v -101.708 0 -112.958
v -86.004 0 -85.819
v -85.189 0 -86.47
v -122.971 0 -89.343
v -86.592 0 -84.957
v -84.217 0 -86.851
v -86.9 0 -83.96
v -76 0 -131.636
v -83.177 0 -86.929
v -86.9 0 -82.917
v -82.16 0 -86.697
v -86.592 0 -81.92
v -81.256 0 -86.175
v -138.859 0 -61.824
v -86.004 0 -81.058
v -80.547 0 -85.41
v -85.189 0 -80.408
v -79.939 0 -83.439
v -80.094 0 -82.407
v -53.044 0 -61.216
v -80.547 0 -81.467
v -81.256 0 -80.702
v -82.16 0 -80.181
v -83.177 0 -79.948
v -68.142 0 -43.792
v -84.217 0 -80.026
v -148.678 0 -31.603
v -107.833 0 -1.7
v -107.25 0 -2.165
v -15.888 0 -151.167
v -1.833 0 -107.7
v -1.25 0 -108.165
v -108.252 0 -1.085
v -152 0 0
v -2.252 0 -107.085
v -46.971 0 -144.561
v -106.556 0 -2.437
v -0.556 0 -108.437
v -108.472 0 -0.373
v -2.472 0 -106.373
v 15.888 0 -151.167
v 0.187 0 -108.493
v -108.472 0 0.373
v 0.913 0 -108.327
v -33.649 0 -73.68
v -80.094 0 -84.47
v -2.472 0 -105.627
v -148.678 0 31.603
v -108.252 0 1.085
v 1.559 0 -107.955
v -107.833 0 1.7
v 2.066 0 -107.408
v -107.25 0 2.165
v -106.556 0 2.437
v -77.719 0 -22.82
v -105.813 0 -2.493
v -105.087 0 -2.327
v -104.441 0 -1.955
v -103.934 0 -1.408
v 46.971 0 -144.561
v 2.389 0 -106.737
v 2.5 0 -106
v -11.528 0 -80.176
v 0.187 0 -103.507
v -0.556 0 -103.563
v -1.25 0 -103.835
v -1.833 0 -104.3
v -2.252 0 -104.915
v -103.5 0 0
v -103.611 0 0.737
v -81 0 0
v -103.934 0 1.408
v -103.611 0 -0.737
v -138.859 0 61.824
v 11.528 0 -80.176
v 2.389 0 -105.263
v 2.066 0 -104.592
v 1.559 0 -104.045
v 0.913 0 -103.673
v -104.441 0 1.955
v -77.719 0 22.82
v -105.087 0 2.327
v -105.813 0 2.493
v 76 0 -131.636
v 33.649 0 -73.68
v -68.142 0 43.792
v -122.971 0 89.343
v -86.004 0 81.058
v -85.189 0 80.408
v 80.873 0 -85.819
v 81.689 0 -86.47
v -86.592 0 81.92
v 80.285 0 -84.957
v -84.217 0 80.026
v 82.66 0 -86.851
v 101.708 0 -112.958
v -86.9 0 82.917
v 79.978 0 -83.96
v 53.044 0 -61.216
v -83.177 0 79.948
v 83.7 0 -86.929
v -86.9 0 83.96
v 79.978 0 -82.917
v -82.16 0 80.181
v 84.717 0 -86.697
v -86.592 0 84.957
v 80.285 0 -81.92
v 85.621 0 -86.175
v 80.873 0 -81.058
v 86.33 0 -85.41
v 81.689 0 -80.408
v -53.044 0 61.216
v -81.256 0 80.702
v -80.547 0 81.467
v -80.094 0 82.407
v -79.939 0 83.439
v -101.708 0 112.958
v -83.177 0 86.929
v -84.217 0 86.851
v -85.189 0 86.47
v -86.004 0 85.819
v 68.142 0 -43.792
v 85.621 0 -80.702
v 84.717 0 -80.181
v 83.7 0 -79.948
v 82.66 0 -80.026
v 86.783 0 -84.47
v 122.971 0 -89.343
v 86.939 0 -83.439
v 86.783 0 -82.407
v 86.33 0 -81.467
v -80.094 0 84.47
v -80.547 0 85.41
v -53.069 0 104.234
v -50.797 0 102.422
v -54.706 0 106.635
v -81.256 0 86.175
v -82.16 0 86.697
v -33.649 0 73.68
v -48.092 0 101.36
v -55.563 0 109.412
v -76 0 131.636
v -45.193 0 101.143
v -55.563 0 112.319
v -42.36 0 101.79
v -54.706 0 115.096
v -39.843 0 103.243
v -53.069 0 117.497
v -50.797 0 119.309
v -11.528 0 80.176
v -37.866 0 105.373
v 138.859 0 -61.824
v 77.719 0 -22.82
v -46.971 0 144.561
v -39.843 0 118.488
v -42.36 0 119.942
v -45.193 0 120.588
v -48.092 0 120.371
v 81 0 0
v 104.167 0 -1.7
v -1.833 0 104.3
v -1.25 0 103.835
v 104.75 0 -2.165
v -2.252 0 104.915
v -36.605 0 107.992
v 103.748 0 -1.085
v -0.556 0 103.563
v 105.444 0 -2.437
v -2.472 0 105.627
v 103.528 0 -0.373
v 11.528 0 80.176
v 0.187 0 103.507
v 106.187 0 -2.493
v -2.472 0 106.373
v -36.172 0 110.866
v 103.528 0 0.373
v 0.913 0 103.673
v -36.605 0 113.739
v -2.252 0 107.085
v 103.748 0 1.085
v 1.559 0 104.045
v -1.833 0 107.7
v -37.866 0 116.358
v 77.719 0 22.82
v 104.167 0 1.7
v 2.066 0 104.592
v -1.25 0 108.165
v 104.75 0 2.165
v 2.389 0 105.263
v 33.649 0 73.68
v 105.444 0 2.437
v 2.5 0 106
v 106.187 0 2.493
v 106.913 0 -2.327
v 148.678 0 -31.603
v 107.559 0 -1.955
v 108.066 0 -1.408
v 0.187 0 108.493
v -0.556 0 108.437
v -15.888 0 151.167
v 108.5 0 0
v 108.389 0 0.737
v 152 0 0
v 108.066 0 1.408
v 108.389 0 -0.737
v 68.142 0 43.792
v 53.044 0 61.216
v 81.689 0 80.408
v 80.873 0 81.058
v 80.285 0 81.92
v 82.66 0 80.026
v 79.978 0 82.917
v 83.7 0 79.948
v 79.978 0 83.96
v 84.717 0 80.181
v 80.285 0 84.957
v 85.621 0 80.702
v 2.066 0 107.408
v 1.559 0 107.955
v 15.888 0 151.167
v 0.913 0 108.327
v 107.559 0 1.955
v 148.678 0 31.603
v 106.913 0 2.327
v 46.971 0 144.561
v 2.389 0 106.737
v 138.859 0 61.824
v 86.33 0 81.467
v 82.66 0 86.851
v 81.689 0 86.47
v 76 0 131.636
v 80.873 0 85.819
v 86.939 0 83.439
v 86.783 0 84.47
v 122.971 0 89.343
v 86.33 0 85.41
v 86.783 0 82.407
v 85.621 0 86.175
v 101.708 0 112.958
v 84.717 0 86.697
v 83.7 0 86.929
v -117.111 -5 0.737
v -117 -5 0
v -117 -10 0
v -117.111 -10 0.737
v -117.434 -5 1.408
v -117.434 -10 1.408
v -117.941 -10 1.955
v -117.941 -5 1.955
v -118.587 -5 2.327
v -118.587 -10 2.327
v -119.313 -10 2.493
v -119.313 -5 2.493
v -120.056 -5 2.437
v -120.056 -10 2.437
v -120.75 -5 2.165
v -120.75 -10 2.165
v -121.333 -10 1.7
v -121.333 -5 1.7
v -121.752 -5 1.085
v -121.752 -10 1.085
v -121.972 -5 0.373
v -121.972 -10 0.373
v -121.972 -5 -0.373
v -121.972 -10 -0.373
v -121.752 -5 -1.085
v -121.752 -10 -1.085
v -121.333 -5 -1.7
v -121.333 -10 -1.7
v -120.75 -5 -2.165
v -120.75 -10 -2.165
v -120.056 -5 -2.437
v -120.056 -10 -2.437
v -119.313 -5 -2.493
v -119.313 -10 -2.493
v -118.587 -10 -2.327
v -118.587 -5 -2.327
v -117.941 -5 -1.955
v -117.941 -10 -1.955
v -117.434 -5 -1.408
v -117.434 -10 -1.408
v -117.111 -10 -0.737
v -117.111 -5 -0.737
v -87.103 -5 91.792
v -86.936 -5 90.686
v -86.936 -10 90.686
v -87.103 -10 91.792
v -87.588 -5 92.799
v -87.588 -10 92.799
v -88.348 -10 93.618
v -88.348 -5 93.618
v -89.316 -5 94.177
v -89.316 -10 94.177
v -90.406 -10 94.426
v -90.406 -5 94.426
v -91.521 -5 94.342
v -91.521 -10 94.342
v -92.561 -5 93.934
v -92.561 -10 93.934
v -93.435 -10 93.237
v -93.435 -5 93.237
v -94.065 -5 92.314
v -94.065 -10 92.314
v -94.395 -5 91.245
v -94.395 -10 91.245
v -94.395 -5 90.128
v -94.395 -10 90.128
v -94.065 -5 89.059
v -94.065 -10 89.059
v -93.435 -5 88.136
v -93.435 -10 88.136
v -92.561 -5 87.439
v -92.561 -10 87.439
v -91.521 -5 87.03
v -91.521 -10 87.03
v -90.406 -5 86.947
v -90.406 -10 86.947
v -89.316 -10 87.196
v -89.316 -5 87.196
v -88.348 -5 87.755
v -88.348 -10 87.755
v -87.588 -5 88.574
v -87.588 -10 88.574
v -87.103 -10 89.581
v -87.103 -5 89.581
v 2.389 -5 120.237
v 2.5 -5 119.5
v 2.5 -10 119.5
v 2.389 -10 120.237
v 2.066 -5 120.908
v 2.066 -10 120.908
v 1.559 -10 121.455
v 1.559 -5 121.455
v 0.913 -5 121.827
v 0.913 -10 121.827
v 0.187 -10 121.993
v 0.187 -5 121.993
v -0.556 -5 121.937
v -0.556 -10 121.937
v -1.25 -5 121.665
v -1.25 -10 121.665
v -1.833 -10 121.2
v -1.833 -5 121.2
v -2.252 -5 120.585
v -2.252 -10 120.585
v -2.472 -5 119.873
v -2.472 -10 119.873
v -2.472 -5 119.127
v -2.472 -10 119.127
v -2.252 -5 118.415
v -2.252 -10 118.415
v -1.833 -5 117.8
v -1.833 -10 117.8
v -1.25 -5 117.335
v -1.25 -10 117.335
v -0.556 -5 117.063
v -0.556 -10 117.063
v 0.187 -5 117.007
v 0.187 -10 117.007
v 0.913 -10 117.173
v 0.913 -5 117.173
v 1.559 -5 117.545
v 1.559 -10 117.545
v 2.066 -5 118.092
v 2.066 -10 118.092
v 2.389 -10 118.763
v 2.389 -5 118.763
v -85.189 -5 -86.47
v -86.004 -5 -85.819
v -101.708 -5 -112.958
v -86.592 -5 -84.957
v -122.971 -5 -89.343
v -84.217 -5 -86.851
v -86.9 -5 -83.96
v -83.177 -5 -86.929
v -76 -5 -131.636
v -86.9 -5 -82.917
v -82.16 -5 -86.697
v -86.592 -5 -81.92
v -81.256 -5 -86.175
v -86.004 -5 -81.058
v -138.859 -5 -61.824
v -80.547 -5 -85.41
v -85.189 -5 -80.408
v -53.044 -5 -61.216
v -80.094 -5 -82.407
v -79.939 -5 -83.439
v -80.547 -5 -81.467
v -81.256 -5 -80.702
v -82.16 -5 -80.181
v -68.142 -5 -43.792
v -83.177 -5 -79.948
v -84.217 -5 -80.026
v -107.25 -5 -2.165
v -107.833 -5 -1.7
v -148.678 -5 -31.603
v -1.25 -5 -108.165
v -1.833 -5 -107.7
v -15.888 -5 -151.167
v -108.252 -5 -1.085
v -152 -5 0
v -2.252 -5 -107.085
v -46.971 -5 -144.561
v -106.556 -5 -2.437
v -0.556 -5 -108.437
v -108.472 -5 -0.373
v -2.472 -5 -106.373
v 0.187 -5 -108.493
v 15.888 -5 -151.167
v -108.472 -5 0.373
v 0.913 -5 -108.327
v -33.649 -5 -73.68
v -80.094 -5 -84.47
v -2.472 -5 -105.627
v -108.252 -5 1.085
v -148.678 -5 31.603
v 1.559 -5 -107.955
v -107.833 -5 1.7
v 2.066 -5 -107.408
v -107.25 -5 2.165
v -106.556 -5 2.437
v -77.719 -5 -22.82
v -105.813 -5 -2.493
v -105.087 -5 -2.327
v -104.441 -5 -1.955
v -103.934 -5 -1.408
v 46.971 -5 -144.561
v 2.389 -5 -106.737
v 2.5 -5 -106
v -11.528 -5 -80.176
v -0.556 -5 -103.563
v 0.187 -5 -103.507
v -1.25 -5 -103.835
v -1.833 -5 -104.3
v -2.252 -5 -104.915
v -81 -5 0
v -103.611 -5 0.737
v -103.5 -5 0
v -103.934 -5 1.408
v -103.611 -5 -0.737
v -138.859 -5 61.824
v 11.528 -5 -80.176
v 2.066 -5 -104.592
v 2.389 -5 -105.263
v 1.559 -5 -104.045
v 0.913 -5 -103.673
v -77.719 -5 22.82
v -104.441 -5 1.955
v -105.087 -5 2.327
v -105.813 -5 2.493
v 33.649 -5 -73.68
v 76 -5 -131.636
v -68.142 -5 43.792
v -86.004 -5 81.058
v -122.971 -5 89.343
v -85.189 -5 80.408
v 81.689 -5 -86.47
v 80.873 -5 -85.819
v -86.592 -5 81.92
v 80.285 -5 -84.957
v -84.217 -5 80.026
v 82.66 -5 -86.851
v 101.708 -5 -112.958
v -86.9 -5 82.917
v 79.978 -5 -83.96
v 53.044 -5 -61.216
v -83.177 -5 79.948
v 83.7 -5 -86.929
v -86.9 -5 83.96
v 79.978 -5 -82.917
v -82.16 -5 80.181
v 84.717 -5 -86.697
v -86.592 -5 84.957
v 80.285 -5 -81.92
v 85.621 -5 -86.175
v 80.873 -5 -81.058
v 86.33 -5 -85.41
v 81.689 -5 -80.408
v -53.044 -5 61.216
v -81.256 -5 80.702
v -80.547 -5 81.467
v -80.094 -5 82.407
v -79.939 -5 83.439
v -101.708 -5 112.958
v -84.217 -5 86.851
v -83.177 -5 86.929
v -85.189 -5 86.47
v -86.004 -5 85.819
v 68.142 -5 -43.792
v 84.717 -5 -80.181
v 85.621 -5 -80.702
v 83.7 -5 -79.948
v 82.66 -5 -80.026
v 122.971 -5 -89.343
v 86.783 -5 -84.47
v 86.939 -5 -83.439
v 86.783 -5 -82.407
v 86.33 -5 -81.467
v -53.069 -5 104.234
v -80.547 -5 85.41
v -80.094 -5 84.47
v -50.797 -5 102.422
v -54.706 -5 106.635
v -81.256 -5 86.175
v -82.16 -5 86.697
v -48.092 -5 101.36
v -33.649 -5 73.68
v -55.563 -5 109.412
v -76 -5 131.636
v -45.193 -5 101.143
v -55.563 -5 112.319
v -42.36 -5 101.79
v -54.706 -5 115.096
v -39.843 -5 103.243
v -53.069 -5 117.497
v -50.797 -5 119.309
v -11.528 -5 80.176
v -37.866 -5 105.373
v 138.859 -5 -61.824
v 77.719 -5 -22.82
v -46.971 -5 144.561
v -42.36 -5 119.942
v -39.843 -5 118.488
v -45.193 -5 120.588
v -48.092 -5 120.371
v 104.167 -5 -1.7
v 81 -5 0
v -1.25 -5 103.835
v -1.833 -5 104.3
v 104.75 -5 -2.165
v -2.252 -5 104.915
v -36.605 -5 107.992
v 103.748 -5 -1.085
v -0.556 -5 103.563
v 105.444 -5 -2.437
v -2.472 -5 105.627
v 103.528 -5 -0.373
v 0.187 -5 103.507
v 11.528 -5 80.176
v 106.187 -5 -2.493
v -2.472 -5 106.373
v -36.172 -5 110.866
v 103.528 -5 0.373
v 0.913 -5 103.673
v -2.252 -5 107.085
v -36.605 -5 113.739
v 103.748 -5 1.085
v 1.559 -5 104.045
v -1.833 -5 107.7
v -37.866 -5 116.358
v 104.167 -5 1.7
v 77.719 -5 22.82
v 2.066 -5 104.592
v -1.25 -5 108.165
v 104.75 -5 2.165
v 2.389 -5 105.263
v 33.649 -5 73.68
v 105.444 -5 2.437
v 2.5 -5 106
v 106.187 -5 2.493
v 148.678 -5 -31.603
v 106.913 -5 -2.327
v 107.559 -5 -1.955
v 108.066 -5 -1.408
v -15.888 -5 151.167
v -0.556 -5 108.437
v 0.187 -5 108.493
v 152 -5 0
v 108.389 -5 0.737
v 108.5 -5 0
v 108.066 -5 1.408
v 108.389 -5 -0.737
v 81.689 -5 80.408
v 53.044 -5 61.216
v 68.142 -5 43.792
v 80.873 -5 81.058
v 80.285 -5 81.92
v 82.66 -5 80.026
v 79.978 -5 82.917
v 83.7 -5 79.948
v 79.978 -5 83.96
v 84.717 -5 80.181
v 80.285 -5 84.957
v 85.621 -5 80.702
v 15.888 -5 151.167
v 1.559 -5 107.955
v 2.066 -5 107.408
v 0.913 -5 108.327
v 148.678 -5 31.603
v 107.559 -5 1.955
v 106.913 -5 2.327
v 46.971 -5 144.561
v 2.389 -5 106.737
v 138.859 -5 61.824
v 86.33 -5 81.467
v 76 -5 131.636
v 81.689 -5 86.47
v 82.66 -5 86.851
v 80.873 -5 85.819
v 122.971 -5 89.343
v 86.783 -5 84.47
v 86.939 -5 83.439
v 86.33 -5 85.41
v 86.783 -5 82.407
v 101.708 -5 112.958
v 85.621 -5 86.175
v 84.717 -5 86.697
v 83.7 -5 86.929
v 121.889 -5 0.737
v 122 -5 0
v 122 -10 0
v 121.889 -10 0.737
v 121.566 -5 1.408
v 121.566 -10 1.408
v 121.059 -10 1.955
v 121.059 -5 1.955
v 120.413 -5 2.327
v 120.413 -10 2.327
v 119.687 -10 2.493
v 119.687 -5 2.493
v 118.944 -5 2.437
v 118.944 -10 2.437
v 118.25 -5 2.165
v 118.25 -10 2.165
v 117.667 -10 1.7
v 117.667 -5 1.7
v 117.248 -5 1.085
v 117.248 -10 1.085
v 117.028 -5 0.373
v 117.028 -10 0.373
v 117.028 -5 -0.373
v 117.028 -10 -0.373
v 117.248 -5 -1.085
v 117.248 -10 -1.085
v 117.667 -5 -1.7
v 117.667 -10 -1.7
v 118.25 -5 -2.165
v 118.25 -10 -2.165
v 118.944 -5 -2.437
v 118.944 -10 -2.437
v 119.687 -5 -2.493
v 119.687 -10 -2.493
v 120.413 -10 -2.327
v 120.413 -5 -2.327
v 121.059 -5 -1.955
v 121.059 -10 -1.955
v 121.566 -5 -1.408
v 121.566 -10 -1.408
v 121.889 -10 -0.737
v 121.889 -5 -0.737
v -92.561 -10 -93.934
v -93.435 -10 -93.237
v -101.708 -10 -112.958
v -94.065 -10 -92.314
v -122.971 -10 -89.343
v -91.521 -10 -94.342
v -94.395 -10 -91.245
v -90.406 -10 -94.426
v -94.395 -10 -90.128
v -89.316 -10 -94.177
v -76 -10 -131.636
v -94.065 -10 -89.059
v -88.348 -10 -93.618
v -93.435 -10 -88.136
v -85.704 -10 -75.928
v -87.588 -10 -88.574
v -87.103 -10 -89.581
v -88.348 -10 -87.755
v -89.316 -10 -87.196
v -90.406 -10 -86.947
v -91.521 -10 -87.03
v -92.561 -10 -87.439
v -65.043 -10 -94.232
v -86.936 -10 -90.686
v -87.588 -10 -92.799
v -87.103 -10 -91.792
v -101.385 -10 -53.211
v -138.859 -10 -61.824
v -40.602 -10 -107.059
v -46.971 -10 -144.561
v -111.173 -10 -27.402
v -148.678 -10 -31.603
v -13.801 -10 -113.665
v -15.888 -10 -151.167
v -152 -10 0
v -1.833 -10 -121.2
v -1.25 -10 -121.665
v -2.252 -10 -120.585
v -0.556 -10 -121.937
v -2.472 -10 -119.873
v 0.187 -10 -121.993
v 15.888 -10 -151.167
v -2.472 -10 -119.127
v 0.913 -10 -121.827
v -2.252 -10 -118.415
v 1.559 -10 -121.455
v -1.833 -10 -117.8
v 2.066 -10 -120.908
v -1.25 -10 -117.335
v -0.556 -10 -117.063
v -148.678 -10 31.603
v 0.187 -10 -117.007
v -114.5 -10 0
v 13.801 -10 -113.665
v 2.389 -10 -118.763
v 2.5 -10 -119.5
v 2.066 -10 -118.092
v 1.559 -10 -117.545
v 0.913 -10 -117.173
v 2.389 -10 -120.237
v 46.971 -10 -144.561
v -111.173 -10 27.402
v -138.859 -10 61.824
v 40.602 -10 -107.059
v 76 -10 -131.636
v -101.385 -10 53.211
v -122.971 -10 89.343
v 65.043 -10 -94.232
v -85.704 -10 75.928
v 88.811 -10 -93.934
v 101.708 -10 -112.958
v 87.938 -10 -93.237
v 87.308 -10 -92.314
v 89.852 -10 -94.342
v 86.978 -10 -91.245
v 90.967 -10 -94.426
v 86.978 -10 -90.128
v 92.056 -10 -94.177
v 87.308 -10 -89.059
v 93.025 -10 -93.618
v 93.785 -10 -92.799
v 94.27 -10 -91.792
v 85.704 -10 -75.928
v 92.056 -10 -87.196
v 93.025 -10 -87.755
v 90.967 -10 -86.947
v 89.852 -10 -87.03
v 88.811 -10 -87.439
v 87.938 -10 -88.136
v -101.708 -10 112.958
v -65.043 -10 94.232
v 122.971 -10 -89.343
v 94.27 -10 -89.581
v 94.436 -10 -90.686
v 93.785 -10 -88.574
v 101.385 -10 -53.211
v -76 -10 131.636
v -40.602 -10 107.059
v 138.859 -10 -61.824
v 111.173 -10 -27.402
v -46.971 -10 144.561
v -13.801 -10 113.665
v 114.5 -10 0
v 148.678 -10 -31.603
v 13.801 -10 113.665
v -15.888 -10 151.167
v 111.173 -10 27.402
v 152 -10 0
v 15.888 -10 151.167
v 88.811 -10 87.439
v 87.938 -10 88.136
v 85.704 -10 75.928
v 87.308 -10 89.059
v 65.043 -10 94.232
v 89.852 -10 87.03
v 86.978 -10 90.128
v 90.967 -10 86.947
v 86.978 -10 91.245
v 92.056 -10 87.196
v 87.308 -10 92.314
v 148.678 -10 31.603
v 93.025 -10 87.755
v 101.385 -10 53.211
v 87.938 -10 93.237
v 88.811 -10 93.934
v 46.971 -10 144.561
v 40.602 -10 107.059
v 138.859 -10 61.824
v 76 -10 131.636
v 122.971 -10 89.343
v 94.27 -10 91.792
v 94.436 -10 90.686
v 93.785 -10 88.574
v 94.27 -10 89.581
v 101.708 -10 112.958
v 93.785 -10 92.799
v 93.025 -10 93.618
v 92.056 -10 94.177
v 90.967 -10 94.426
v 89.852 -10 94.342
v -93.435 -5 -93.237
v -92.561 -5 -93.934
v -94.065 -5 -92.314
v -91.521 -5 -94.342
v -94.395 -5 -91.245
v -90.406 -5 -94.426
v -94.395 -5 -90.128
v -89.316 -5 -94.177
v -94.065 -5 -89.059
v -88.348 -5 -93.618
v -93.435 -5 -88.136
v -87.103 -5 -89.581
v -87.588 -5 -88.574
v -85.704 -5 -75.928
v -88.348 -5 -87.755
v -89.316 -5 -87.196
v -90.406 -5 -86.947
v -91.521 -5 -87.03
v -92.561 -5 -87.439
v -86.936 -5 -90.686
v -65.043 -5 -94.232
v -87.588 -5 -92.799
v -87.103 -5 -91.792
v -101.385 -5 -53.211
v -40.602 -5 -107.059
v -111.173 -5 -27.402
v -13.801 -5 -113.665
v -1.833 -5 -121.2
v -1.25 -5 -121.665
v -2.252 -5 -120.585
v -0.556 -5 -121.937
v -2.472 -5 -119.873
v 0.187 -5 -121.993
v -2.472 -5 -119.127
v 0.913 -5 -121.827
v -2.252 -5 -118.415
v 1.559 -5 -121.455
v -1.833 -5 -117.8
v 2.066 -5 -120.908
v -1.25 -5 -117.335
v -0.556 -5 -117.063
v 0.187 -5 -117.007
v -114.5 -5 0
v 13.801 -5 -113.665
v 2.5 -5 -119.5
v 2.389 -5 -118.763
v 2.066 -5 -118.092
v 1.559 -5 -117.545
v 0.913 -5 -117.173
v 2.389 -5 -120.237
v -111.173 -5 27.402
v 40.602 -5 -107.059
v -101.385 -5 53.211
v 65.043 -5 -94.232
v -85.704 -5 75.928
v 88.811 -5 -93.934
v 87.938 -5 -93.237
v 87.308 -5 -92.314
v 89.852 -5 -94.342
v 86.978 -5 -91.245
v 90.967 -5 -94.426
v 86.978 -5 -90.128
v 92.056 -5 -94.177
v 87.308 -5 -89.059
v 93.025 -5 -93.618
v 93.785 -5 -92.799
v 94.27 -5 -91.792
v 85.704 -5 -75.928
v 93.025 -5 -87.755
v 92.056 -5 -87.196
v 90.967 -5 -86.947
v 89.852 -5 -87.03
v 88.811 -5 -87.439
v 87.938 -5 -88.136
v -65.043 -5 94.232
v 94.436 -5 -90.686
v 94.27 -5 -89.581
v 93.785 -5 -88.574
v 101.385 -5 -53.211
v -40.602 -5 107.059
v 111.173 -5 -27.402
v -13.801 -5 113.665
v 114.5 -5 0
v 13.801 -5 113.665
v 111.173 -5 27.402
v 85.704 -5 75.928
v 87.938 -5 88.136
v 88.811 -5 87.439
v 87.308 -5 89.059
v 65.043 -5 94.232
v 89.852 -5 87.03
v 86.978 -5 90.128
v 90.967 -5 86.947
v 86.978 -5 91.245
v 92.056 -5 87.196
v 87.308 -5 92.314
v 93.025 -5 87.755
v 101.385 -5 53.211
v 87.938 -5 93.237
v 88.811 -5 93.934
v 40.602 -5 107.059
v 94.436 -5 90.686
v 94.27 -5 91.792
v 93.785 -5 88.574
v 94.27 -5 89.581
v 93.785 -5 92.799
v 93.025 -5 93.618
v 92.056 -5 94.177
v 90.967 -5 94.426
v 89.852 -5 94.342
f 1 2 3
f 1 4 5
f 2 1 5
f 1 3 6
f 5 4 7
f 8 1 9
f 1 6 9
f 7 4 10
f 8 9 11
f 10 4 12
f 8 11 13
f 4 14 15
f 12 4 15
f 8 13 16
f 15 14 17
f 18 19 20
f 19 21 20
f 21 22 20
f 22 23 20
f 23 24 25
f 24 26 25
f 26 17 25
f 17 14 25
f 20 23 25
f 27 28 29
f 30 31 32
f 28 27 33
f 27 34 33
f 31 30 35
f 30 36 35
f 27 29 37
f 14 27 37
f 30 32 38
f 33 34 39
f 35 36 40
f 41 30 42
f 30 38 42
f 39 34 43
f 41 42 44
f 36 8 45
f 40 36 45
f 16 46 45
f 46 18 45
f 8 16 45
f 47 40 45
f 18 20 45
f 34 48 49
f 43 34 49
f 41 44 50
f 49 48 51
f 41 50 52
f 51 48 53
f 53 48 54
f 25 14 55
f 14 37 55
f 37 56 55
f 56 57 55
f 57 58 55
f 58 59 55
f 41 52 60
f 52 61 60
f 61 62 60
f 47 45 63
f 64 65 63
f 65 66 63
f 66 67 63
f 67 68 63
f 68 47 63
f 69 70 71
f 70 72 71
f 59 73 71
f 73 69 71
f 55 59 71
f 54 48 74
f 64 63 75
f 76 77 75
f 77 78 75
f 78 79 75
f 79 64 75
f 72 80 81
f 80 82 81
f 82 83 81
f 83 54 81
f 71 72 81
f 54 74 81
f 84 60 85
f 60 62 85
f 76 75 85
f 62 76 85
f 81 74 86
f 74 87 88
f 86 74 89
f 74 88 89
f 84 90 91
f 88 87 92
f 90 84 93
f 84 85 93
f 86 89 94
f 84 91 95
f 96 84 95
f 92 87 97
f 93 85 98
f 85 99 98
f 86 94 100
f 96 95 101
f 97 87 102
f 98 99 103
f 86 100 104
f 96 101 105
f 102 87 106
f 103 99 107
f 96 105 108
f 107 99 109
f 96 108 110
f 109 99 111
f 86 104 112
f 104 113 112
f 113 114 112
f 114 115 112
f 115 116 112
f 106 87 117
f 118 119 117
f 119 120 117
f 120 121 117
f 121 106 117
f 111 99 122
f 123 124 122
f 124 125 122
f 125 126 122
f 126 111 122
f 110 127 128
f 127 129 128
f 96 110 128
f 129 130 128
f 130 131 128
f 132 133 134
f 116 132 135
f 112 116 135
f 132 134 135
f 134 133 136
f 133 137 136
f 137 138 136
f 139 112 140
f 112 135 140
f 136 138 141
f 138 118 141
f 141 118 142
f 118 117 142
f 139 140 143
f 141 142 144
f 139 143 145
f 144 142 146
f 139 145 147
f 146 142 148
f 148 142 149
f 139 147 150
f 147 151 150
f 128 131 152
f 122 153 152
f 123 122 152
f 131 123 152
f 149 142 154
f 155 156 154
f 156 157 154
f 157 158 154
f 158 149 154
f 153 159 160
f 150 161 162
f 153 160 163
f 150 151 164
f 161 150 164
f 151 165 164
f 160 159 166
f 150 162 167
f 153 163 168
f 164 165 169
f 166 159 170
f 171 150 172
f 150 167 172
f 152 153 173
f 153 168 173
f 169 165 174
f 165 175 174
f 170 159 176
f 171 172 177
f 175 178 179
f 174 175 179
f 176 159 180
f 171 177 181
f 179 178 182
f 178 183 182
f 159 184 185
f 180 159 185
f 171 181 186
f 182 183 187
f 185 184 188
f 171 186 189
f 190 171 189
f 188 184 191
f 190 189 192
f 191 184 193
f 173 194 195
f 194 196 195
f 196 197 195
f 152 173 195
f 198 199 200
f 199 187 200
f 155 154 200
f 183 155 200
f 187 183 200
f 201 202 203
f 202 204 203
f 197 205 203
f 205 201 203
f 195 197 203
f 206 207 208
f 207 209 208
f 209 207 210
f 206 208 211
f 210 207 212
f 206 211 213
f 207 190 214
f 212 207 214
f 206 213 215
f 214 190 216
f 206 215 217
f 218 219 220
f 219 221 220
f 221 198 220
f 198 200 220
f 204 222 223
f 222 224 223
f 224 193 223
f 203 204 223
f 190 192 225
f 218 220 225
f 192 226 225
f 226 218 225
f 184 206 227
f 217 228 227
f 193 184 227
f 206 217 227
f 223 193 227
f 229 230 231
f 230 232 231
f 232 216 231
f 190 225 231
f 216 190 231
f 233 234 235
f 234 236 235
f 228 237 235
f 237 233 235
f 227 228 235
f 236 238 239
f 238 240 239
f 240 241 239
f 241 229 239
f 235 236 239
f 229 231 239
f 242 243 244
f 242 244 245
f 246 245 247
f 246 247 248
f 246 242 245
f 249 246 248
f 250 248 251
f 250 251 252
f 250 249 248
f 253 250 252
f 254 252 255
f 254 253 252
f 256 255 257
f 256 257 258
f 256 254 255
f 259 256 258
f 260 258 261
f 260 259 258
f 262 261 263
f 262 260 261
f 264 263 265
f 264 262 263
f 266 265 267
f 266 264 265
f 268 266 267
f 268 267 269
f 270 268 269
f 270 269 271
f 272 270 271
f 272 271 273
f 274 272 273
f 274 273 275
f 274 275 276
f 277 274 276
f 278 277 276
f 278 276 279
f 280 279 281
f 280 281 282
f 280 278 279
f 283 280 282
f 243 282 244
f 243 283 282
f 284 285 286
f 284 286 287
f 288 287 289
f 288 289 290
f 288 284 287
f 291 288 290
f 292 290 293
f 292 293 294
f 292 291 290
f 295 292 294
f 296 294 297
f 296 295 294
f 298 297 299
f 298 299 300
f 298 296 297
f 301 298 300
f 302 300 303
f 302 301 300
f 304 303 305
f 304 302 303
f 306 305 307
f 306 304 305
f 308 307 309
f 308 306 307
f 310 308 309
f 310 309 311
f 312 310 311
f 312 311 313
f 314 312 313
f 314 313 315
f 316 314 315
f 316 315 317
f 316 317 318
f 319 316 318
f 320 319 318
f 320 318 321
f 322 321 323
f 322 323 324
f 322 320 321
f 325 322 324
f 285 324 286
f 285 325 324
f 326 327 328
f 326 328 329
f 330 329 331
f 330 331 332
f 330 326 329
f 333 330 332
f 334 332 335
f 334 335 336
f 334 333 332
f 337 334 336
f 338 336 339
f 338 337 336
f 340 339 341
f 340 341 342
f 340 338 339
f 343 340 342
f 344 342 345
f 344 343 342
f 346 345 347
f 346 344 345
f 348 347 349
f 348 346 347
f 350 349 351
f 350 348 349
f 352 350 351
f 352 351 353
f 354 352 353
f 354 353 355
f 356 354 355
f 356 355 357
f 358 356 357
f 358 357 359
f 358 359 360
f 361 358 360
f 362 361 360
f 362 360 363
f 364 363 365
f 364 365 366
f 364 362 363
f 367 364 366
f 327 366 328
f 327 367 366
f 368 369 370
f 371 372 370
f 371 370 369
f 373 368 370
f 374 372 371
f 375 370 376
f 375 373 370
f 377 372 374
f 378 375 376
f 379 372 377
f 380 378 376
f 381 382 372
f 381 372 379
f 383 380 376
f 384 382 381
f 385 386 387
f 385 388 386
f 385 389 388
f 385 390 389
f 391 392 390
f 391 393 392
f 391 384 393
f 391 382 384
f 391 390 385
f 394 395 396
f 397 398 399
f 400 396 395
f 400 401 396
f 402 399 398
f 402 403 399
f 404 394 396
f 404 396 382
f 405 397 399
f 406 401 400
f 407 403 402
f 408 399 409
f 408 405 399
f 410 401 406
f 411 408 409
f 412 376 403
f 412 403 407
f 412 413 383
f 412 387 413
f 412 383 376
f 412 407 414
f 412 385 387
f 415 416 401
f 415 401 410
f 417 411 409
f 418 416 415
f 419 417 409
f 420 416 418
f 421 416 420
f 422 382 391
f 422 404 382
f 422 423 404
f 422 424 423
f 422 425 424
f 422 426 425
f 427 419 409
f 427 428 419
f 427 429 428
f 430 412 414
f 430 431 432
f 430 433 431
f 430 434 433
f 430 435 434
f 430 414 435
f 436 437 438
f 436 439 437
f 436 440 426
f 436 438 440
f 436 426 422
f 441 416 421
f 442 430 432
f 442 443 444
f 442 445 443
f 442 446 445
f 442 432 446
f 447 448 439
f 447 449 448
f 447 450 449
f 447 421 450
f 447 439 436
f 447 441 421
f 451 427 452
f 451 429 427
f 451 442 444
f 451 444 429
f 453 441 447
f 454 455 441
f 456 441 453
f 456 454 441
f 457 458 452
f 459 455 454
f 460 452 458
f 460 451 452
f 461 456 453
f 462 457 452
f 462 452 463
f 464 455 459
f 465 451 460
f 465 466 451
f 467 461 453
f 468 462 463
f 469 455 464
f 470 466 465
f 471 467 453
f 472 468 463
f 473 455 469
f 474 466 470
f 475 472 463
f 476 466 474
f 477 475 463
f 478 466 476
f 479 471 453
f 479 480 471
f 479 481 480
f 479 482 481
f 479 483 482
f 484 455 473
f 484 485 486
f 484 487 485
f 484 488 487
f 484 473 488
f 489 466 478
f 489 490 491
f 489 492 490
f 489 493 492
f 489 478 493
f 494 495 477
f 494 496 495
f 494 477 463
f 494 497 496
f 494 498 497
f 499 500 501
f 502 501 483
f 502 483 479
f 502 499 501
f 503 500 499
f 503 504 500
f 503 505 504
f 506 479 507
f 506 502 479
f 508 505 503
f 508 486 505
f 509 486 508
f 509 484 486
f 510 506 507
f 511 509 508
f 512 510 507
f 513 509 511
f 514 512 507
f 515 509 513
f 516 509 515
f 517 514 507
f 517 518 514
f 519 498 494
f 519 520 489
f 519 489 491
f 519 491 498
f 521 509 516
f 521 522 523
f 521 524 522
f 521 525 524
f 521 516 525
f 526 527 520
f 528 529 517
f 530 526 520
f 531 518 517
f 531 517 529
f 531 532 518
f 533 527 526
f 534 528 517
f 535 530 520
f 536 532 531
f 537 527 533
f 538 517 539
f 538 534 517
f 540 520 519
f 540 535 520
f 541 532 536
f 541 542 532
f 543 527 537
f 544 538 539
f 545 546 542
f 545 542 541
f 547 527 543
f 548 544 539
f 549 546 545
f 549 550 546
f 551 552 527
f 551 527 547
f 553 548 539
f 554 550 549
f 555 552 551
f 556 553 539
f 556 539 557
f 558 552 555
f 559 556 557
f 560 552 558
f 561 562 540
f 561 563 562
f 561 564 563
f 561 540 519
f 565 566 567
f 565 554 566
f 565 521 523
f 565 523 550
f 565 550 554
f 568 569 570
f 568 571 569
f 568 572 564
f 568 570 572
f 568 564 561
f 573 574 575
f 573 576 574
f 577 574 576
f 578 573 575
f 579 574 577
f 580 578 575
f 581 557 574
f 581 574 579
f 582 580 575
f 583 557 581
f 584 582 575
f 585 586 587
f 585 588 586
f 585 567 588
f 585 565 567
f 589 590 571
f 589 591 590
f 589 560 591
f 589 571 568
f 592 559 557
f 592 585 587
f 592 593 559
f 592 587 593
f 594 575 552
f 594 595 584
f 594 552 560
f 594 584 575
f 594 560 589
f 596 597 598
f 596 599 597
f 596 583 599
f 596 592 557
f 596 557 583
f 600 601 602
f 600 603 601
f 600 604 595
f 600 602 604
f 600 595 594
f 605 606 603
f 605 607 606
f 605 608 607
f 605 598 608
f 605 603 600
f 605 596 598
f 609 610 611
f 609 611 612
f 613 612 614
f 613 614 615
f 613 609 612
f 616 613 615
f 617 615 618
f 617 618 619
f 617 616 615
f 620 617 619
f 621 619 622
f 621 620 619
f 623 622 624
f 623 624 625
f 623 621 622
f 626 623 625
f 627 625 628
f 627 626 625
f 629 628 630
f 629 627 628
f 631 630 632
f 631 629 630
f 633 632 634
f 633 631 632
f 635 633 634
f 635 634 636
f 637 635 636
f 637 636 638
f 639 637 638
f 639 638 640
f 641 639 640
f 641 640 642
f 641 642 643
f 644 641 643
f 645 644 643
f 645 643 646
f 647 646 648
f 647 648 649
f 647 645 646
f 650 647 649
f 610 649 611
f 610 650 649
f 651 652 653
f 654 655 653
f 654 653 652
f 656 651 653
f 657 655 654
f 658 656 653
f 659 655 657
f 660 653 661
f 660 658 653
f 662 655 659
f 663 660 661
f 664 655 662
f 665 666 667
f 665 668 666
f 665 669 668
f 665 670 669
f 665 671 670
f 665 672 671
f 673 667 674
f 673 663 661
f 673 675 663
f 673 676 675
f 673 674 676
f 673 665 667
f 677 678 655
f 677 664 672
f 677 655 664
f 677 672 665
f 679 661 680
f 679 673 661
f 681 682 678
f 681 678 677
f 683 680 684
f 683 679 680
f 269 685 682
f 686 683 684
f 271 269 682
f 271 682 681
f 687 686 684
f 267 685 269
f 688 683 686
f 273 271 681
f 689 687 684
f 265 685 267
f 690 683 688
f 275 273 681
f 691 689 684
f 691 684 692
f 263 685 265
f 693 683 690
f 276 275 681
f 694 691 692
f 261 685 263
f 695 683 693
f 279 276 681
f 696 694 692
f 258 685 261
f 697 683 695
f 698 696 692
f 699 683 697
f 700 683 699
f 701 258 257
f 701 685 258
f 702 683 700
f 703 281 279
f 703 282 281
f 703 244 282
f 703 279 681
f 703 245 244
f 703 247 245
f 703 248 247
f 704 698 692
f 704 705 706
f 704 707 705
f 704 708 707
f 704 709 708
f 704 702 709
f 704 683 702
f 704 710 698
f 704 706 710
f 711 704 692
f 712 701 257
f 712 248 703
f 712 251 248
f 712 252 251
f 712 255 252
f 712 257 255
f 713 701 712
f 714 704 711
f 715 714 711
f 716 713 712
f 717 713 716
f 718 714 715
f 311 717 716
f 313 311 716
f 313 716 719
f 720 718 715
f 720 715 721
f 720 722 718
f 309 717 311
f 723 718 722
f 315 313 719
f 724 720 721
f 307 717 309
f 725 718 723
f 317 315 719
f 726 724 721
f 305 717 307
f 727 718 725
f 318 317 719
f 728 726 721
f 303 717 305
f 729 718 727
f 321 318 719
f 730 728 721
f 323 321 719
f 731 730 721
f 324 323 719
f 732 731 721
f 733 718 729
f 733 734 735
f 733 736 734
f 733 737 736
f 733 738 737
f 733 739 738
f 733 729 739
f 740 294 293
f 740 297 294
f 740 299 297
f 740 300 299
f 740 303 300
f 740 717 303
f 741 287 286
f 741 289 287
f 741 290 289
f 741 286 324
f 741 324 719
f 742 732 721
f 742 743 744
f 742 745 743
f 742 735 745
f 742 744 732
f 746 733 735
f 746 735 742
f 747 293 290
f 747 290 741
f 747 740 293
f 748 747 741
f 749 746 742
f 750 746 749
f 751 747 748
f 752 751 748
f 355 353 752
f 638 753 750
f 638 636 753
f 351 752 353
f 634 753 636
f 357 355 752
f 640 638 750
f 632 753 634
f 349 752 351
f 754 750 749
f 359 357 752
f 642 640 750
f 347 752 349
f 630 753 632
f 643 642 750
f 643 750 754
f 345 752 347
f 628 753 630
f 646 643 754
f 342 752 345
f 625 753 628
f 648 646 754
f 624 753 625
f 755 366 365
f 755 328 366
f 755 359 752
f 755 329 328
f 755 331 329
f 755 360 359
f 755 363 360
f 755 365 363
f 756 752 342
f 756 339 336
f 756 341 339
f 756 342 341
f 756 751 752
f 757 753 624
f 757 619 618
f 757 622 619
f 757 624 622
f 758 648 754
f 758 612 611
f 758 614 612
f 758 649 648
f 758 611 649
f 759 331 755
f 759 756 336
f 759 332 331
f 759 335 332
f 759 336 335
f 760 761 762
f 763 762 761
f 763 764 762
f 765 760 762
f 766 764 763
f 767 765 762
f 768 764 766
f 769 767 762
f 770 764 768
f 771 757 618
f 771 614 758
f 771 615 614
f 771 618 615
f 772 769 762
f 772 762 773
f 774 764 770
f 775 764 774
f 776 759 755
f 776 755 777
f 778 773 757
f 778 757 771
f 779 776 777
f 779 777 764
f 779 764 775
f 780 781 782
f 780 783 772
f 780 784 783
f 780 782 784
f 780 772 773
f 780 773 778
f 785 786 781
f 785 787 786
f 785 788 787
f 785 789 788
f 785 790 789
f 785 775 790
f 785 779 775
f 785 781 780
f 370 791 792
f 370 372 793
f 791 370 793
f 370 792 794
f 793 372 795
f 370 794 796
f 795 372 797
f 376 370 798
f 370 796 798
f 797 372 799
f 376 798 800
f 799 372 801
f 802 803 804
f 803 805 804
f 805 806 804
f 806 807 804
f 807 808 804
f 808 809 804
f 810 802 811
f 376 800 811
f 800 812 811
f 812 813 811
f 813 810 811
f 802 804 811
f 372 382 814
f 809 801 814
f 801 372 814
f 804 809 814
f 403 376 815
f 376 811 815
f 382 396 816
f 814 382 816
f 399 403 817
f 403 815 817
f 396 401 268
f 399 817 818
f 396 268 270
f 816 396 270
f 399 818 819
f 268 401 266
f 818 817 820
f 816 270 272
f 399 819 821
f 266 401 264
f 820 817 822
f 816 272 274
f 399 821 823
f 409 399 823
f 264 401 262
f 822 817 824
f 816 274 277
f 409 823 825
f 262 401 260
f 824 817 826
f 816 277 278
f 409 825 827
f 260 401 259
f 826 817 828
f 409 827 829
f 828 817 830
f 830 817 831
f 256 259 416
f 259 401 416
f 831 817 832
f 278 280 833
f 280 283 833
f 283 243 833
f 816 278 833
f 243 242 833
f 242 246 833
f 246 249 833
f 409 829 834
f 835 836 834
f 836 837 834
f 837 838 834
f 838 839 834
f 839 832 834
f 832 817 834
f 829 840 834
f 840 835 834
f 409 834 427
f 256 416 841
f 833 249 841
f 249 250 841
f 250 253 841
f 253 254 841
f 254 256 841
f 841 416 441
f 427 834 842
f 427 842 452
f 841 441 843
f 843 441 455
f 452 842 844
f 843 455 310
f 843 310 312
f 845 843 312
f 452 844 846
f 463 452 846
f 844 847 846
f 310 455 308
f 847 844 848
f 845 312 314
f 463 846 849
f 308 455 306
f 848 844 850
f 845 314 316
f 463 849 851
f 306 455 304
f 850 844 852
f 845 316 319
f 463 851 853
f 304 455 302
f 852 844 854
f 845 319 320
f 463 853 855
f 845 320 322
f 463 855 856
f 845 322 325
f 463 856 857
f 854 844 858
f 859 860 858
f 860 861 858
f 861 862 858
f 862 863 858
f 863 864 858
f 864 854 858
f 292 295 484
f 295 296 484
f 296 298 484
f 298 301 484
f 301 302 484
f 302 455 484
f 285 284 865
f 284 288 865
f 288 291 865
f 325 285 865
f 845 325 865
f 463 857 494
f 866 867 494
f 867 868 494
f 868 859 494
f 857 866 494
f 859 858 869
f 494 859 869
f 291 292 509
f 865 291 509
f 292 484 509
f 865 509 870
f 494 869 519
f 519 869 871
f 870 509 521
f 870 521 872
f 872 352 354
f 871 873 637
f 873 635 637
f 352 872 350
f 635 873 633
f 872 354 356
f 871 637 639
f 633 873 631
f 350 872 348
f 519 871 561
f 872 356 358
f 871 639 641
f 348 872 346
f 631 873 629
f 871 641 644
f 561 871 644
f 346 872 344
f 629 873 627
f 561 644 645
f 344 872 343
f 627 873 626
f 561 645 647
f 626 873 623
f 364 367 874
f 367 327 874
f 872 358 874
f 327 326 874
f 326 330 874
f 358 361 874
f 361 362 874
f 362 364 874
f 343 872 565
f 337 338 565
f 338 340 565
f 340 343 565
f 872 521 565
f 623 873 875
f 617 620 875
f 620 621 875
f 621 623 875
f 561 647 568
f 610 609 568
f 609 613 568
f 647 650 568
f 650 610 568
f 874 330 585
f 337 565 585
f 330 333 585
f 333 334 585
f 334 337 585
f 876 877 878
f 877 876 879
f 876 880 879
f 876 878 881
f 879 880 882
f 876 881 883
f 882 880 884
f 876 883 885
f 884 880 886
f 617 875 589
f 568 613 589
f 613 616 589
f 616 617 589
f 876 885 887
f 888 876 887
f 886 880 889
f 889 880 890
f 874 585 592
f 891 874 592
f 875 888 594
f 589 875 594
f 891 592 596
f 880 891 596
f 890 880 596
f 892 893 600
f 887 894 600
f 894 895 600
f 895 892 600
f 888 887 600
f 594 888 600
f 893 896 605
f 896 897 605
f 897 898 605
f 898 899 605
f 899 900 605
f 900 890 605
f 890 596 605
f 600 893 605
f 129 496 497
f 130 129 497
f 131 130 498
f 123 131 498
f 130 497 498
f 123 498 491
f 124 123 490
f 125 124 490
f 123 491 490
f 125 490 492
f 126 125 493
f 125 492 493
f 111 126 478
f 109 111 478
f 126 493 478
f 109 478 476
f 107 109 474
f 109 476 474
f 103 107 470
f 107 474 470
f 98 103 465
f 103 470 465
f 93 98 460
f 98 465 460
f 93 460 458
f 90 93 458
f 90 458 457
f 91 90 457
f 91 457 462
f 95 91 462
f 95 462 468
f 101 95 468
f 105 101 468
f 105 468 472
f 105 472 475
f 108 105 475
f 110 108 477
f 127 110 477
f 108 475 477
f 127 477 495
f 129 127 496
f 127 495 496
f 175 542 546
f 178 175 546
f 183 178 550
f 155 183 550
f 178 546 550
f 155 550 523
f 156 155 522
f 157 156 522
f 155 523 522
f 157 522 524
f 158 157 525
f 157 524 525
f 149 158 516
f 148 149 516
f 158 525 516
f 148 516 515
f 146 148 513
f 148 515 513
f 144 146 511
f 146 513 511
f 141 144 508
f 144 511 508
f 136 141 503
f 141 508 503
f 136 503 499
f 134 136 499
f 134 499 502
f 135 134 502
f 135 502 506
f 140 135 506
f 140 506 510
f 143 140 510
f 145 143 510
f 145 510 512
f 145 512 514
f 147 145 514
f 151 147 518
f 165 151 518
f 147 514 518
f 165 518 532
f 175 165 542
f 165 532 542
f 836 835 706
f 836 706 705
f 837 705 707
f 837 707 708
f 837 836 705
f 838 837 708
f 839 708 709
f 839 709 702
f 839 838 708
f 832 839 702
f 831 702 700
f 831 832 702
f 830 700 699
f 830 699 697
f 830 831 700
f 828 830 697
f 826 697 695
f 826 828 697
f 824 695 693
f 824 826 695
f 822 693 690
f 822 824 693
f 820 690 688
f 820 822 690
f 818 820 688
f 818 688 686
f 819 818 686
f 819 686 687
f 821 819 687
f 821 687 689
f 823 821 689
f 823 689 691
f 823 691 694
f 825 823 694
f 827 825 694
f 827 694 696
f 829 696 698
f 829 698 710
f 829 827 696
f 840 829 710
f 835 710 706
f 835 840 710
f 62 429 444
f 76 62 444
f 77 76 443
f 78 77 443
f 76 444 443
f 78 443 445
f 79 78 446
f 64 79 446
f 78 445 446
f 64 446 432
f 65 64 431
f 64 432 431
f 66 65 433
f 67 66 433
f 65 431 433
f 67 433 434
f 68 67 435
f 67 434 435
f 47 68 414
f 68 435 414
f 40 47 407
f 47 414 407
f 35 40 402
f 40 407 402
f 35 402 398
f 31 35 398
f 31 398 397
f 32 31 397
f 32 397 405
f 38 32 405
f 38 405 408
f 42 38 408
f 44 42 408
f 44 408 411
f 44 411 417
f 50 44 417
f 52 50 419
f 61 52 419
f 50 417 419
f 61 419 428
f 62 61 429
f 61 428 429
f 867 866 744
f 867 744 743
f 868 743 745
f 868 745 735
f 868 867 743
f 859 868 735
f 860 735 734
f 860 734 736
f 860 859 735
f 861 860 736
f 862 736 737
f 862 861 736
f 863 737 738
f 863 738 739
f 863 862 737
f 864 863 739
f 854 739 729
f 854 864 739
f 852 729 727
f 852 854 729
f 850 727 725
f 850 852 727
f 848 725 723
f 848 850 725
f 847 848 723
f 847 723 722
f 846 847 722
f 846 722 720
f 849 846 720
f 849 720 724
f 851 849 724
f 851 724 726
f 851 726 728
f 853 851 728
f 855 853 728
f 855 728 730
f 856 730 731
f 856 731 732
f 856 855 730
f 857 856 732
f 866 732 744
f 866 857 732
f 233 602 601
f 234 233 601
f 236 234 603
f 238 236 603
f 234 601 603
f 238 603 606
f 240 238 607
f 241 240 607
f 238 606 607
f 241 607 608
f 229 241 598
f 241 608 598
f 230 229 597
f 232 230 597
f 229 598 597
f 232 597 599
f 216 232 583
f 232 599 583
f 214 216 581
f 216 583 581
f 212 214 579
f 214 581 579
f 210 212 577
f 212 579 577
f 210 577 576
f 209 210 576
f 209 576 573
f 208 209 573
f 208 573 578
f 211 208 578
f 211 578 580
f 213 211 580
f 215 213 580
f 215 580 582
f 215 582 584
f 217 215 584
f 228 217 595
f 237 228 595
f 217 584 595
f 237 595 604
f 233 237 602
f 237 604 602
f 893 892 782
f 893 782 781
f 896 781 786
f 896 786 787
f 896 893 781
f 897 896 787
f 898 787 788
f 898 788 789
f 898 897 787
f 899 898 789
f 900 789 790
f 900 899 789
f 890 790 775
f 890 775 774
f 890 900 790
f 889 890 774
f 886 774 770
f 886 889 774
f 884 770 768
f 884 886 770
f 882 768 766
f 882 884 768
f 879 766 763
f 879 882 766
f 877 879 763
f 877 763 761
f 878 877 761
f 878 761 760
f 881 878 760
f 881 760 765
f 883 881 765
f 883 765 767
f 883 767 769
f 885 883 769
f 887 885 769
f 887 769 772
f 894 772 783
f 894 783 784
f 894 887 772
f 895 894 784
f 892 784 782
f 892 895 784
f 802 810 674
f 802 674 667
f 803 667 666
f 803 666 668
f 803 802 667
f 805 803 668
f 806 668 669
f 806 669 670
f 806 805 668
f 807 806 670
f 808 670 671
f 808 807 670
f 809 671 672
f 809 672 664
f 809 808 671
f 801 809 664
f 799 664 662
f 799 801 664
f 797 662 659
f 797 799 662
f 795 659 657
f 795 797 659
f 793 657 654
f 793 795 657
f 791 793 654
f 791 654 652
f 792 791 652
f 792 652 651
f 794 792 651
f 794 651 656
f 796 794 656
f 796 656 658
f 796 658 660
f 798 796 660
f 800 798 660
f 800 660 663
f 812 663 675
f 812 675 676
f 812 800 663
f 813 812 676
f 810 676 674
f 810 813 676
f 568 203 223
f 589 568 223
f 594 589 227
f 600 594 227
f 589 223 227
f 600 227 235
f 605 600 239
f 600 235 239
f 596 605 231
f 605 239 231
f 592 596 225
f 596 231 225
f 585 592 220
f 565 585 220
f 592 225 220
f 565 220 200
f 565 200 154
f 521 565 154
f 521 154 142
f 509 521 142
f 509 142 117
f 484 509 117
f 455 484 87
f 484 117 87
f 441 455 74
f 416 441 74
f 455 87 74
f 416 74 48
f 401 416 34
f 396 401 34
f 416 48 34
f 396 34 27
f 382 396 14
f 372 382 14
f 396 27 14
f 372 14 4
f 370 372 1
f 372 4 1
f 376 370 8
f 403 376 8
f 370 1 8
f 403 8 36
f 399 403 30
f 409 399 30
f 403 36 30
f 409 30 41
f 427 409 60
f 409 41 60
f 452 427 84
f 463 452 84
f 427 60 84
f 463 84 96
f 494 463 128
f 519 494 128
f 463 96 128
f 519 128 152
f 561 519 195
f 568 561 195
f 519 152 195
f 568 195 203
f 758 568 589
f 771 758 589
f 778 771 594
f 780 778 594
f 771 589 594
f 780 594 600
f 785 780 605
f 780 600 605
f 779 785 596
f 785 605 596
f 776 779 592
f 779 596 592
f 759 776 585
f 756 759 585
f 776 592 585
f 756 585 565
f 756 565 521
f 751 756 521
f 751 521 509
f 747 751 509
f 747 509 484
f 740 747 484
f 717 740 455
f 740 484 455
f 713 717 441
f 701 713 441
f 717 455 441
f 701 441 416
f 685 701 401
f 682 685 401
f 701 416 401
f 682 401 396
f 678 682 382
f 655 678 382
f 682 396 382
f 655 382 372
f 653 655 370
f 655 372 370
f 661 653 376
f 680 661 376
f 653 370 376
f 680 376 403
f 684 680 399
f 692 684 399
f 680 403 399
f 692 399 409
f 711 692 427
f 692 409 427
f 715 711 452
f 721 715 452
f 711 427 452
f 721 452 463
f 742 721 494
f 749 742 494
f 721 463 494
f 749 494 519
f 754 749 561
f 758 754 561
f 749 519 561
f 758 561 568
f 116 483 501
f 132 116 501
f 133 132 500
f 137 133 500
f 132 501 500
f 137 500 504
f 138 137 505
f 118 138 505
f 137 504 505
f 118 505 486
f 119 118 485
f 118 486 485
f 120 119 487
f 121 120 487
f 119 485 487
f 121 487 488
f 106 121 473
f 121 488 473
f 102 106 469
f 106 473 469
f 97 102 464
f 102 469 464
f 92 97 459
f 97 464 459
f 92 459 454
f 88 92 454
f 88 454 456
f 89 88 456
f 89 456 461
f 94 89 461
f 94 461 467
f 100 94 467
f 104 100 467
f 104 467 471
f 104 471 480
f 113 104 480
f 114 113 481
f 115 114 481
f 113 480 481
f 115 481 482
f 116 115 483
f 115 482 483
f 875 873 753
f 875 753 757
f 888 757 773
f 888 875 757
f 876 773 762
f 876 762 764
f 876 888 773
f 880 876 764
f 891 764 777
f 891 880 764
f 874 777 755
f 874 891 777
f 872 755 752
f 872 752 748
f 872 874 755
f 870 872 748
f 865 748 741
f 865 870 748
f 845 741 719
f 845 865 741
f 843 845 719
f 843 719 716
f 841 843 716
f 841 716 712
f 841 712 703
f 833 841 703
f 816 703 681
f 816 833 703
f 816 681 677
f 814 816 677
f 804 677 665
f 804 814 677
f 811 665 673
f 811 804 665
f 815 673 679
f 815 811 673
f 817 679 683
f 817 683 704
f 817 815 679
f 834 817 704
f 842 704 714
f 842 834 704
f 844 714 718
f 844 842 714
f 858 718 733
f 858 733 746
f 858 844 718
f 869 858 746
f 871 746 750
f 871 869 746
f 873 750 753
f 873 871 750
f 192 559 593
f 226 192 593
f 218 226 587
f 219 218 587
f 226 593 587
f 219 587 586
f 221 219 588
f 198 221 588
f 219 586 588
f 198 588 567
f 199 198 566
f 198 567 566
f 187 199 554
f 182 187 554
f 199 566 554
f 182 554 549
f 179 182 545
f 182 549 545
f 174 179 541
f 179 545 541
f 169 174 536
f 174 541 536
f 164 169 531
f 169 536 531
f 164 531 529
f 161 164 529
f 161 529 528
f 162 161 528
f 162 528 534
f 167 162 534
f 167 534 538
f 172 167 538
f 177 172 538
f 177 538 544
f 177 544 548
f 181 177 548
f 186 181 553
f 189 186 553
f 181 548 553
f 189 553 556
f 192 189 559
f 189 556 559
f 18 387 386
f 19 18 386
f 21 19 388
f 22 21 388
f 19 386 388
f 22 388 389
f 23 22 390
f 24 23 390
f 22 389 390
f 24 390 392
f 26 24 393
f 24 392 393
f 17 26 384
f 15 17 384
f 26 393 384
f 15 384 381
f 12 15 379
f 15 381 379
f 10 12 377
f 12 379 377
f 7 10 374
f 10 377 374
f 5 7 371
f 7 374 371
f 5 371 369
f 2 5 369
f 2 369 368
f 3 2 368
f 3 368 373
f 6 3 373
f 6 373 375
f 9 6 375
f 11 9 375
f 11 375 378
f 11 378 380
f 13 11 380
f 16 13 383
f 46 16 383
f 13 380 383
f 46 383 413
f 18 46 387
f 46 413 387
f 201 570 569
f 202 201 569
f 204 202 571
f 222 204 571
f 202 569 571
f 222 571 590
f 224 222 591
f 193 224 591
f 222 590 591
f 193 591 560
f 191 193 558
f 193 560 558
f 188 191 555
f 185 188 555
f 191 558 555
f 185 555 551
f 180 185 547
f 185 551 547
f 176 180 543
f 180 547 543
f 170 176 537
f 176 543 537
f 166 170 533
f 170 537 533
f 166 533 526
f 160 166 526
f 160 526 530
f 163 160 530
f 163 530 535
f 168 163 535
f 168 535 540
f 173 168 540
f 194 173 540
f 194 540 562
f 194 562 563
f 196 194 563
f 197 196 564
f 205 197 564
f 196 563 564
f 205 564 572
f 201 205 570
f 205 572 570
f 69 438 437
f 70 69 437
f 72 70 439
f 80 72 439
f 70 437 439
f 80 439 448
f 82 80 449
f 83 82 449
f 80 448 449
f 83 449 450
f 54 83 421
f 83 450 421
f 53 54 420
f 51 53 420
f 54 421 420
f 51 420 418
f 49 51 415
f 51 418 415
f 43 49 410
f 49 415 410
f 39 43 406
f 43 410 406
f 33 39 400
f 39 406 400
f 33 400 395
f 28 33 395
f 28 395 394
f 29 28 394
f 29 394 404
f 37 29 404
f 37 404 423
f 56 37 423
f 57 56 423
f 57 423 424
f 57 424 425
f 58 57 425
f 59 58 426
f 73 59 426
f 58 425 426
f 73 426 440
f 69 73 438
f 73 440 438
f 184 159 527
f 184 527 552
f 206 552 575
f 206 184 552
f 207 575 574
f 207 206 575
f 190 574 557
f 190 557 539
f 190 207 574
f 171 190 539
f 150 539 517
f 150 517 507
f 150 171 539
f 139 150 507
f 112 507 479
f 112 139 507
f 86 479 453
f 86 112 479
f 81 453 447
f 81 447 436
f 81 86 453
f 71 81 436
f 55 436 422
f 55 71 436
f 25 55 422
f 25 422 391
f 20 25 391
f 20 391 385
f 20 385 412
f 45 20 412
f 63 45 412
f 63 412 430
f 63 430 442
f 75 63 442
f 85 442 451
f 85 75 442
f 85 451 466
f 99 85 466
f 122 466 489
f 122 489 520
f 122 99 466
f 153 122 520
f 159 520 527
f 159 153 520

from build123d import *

# Parameters (mm, degrees)
F0_R      = 152
F0_R_2    = 81
F1_DEPTH  = 5
F2_R      = 2.5
F3_DEPTH  = 5
F5_DEPTH  = 5
F6_DEPTH  = 5
F7_DEPTH  = 5
F8_R      = 3.5
F8_R_2    = 9.75
F9_DEPTH  = 5
F10_R     = 152
F10_R_2   = 3.75
F10_R_3   = 2.5
F10_R_4   = 114.5
F11_DEPTH = 5


with BuildPart() as f1:
    # F0 (on Front) → F1 (new body)
    with BuildSketch(Plane.XZ):
        Circle(F0_R)
        Circle(F0_R_2, mode=Mode.SUBTRACT)
    extrude(amount=F1_DEPTH)

    # F2 (on face) → F3 (cut)
    with BuildSketch(Plane.XZ.offset(5)):
        with Locations((0, 106)):
            Circle(F2_R)
    extrude(amount=-F3_DEPTH, mode=Mode.SUBTRACT)

    # F2 (on face) → F5 (cut)
    with BuildSketch(Plane.XZ.offset(5)):
        with Locations((-106, 0)):
            Circle(F2_R)
    extrude(amount=-F5_DEPTH, mode=Mode.SUBTRACT)

    # F2 (on face) → F6 (cut)
    with BuildSketch(Plane.XZ.offset(5)):
        with Locations((0, -106)):
            Circle(F2_R)
    extrude(amount=-F6_DEPTH, mode=Mode.SUBTRACT)

    # F2 (on face) → F7 (cut)
    with BuildSketch(Plane.XZ.offset(5)):
        with Locations((106, 0)):
            Circle(F2_R)
    extrude(amount=-F7_DEPTH, mode=Mode.SUBTRACT)

    # F8 (on face) → F9 (cut, through all)
    with BuildSketch(Plane.XZ.offset(5)):
        with Locations((83.4386, 83.4386)):
            Circle(F8_R)
        with Locations((83.4386, -83.4386)):
            Circle(F8_R)
        with Locations((-83.4386, -83.4386)):
            Circle(F8_R)
        with Locations((-83.4386, 83.4386)):
            Circle(F8_R)
        with Locations((-45.922012, 110.865544)):
            Circle(F8_R_2)
    extrude(amount=-F9_DEPTH, mode=Mode.SUBTRACT)


with BuildPart() as f11:
    # F10 (on face) → F11 (new body)
    with BuildSketch(Plane.XZ.offset(5)):
        Circle(F10_R)
        with Locations((-90.686445, -90.686445)):
            Circle(F10_R_2, mode=Mode.SUBTRACT)
        with Locations((0, -119.5)):
            Circle(F10_R_3, mode=Mode.SUBTRACT)
        with Locations((90.686445, -90.686445)):
            Circle(F10_R_2, mode=Mode.SUBTRACT)
        with Locations((-119.5, 0)):
            Circle(F10_R_3, mode=Mode.SUBTRACT)
        with Locations((-90.686445, 90.686445)):
            Circle(F10_R_2, mode=Mode.SUBTRACT)
        Circle(F10_R_4, mode=Mode.SUBTRACT)
        with Locations((119.5, 0)):
            Circle(F10_R_3, mode=Mode.SUBTRACT)
        with Locations((0, 119.5)):
            Circle(F10_R_3, mode=Mode.SUBTRACT)
        with Locations((90.686445, 90.686445)):
            Circle(F10_R_2, mode=Mode.SUBTRACT)
    extrude(amount=F11_DEPTH)


solid = Compound([f1.part, f11.part])
